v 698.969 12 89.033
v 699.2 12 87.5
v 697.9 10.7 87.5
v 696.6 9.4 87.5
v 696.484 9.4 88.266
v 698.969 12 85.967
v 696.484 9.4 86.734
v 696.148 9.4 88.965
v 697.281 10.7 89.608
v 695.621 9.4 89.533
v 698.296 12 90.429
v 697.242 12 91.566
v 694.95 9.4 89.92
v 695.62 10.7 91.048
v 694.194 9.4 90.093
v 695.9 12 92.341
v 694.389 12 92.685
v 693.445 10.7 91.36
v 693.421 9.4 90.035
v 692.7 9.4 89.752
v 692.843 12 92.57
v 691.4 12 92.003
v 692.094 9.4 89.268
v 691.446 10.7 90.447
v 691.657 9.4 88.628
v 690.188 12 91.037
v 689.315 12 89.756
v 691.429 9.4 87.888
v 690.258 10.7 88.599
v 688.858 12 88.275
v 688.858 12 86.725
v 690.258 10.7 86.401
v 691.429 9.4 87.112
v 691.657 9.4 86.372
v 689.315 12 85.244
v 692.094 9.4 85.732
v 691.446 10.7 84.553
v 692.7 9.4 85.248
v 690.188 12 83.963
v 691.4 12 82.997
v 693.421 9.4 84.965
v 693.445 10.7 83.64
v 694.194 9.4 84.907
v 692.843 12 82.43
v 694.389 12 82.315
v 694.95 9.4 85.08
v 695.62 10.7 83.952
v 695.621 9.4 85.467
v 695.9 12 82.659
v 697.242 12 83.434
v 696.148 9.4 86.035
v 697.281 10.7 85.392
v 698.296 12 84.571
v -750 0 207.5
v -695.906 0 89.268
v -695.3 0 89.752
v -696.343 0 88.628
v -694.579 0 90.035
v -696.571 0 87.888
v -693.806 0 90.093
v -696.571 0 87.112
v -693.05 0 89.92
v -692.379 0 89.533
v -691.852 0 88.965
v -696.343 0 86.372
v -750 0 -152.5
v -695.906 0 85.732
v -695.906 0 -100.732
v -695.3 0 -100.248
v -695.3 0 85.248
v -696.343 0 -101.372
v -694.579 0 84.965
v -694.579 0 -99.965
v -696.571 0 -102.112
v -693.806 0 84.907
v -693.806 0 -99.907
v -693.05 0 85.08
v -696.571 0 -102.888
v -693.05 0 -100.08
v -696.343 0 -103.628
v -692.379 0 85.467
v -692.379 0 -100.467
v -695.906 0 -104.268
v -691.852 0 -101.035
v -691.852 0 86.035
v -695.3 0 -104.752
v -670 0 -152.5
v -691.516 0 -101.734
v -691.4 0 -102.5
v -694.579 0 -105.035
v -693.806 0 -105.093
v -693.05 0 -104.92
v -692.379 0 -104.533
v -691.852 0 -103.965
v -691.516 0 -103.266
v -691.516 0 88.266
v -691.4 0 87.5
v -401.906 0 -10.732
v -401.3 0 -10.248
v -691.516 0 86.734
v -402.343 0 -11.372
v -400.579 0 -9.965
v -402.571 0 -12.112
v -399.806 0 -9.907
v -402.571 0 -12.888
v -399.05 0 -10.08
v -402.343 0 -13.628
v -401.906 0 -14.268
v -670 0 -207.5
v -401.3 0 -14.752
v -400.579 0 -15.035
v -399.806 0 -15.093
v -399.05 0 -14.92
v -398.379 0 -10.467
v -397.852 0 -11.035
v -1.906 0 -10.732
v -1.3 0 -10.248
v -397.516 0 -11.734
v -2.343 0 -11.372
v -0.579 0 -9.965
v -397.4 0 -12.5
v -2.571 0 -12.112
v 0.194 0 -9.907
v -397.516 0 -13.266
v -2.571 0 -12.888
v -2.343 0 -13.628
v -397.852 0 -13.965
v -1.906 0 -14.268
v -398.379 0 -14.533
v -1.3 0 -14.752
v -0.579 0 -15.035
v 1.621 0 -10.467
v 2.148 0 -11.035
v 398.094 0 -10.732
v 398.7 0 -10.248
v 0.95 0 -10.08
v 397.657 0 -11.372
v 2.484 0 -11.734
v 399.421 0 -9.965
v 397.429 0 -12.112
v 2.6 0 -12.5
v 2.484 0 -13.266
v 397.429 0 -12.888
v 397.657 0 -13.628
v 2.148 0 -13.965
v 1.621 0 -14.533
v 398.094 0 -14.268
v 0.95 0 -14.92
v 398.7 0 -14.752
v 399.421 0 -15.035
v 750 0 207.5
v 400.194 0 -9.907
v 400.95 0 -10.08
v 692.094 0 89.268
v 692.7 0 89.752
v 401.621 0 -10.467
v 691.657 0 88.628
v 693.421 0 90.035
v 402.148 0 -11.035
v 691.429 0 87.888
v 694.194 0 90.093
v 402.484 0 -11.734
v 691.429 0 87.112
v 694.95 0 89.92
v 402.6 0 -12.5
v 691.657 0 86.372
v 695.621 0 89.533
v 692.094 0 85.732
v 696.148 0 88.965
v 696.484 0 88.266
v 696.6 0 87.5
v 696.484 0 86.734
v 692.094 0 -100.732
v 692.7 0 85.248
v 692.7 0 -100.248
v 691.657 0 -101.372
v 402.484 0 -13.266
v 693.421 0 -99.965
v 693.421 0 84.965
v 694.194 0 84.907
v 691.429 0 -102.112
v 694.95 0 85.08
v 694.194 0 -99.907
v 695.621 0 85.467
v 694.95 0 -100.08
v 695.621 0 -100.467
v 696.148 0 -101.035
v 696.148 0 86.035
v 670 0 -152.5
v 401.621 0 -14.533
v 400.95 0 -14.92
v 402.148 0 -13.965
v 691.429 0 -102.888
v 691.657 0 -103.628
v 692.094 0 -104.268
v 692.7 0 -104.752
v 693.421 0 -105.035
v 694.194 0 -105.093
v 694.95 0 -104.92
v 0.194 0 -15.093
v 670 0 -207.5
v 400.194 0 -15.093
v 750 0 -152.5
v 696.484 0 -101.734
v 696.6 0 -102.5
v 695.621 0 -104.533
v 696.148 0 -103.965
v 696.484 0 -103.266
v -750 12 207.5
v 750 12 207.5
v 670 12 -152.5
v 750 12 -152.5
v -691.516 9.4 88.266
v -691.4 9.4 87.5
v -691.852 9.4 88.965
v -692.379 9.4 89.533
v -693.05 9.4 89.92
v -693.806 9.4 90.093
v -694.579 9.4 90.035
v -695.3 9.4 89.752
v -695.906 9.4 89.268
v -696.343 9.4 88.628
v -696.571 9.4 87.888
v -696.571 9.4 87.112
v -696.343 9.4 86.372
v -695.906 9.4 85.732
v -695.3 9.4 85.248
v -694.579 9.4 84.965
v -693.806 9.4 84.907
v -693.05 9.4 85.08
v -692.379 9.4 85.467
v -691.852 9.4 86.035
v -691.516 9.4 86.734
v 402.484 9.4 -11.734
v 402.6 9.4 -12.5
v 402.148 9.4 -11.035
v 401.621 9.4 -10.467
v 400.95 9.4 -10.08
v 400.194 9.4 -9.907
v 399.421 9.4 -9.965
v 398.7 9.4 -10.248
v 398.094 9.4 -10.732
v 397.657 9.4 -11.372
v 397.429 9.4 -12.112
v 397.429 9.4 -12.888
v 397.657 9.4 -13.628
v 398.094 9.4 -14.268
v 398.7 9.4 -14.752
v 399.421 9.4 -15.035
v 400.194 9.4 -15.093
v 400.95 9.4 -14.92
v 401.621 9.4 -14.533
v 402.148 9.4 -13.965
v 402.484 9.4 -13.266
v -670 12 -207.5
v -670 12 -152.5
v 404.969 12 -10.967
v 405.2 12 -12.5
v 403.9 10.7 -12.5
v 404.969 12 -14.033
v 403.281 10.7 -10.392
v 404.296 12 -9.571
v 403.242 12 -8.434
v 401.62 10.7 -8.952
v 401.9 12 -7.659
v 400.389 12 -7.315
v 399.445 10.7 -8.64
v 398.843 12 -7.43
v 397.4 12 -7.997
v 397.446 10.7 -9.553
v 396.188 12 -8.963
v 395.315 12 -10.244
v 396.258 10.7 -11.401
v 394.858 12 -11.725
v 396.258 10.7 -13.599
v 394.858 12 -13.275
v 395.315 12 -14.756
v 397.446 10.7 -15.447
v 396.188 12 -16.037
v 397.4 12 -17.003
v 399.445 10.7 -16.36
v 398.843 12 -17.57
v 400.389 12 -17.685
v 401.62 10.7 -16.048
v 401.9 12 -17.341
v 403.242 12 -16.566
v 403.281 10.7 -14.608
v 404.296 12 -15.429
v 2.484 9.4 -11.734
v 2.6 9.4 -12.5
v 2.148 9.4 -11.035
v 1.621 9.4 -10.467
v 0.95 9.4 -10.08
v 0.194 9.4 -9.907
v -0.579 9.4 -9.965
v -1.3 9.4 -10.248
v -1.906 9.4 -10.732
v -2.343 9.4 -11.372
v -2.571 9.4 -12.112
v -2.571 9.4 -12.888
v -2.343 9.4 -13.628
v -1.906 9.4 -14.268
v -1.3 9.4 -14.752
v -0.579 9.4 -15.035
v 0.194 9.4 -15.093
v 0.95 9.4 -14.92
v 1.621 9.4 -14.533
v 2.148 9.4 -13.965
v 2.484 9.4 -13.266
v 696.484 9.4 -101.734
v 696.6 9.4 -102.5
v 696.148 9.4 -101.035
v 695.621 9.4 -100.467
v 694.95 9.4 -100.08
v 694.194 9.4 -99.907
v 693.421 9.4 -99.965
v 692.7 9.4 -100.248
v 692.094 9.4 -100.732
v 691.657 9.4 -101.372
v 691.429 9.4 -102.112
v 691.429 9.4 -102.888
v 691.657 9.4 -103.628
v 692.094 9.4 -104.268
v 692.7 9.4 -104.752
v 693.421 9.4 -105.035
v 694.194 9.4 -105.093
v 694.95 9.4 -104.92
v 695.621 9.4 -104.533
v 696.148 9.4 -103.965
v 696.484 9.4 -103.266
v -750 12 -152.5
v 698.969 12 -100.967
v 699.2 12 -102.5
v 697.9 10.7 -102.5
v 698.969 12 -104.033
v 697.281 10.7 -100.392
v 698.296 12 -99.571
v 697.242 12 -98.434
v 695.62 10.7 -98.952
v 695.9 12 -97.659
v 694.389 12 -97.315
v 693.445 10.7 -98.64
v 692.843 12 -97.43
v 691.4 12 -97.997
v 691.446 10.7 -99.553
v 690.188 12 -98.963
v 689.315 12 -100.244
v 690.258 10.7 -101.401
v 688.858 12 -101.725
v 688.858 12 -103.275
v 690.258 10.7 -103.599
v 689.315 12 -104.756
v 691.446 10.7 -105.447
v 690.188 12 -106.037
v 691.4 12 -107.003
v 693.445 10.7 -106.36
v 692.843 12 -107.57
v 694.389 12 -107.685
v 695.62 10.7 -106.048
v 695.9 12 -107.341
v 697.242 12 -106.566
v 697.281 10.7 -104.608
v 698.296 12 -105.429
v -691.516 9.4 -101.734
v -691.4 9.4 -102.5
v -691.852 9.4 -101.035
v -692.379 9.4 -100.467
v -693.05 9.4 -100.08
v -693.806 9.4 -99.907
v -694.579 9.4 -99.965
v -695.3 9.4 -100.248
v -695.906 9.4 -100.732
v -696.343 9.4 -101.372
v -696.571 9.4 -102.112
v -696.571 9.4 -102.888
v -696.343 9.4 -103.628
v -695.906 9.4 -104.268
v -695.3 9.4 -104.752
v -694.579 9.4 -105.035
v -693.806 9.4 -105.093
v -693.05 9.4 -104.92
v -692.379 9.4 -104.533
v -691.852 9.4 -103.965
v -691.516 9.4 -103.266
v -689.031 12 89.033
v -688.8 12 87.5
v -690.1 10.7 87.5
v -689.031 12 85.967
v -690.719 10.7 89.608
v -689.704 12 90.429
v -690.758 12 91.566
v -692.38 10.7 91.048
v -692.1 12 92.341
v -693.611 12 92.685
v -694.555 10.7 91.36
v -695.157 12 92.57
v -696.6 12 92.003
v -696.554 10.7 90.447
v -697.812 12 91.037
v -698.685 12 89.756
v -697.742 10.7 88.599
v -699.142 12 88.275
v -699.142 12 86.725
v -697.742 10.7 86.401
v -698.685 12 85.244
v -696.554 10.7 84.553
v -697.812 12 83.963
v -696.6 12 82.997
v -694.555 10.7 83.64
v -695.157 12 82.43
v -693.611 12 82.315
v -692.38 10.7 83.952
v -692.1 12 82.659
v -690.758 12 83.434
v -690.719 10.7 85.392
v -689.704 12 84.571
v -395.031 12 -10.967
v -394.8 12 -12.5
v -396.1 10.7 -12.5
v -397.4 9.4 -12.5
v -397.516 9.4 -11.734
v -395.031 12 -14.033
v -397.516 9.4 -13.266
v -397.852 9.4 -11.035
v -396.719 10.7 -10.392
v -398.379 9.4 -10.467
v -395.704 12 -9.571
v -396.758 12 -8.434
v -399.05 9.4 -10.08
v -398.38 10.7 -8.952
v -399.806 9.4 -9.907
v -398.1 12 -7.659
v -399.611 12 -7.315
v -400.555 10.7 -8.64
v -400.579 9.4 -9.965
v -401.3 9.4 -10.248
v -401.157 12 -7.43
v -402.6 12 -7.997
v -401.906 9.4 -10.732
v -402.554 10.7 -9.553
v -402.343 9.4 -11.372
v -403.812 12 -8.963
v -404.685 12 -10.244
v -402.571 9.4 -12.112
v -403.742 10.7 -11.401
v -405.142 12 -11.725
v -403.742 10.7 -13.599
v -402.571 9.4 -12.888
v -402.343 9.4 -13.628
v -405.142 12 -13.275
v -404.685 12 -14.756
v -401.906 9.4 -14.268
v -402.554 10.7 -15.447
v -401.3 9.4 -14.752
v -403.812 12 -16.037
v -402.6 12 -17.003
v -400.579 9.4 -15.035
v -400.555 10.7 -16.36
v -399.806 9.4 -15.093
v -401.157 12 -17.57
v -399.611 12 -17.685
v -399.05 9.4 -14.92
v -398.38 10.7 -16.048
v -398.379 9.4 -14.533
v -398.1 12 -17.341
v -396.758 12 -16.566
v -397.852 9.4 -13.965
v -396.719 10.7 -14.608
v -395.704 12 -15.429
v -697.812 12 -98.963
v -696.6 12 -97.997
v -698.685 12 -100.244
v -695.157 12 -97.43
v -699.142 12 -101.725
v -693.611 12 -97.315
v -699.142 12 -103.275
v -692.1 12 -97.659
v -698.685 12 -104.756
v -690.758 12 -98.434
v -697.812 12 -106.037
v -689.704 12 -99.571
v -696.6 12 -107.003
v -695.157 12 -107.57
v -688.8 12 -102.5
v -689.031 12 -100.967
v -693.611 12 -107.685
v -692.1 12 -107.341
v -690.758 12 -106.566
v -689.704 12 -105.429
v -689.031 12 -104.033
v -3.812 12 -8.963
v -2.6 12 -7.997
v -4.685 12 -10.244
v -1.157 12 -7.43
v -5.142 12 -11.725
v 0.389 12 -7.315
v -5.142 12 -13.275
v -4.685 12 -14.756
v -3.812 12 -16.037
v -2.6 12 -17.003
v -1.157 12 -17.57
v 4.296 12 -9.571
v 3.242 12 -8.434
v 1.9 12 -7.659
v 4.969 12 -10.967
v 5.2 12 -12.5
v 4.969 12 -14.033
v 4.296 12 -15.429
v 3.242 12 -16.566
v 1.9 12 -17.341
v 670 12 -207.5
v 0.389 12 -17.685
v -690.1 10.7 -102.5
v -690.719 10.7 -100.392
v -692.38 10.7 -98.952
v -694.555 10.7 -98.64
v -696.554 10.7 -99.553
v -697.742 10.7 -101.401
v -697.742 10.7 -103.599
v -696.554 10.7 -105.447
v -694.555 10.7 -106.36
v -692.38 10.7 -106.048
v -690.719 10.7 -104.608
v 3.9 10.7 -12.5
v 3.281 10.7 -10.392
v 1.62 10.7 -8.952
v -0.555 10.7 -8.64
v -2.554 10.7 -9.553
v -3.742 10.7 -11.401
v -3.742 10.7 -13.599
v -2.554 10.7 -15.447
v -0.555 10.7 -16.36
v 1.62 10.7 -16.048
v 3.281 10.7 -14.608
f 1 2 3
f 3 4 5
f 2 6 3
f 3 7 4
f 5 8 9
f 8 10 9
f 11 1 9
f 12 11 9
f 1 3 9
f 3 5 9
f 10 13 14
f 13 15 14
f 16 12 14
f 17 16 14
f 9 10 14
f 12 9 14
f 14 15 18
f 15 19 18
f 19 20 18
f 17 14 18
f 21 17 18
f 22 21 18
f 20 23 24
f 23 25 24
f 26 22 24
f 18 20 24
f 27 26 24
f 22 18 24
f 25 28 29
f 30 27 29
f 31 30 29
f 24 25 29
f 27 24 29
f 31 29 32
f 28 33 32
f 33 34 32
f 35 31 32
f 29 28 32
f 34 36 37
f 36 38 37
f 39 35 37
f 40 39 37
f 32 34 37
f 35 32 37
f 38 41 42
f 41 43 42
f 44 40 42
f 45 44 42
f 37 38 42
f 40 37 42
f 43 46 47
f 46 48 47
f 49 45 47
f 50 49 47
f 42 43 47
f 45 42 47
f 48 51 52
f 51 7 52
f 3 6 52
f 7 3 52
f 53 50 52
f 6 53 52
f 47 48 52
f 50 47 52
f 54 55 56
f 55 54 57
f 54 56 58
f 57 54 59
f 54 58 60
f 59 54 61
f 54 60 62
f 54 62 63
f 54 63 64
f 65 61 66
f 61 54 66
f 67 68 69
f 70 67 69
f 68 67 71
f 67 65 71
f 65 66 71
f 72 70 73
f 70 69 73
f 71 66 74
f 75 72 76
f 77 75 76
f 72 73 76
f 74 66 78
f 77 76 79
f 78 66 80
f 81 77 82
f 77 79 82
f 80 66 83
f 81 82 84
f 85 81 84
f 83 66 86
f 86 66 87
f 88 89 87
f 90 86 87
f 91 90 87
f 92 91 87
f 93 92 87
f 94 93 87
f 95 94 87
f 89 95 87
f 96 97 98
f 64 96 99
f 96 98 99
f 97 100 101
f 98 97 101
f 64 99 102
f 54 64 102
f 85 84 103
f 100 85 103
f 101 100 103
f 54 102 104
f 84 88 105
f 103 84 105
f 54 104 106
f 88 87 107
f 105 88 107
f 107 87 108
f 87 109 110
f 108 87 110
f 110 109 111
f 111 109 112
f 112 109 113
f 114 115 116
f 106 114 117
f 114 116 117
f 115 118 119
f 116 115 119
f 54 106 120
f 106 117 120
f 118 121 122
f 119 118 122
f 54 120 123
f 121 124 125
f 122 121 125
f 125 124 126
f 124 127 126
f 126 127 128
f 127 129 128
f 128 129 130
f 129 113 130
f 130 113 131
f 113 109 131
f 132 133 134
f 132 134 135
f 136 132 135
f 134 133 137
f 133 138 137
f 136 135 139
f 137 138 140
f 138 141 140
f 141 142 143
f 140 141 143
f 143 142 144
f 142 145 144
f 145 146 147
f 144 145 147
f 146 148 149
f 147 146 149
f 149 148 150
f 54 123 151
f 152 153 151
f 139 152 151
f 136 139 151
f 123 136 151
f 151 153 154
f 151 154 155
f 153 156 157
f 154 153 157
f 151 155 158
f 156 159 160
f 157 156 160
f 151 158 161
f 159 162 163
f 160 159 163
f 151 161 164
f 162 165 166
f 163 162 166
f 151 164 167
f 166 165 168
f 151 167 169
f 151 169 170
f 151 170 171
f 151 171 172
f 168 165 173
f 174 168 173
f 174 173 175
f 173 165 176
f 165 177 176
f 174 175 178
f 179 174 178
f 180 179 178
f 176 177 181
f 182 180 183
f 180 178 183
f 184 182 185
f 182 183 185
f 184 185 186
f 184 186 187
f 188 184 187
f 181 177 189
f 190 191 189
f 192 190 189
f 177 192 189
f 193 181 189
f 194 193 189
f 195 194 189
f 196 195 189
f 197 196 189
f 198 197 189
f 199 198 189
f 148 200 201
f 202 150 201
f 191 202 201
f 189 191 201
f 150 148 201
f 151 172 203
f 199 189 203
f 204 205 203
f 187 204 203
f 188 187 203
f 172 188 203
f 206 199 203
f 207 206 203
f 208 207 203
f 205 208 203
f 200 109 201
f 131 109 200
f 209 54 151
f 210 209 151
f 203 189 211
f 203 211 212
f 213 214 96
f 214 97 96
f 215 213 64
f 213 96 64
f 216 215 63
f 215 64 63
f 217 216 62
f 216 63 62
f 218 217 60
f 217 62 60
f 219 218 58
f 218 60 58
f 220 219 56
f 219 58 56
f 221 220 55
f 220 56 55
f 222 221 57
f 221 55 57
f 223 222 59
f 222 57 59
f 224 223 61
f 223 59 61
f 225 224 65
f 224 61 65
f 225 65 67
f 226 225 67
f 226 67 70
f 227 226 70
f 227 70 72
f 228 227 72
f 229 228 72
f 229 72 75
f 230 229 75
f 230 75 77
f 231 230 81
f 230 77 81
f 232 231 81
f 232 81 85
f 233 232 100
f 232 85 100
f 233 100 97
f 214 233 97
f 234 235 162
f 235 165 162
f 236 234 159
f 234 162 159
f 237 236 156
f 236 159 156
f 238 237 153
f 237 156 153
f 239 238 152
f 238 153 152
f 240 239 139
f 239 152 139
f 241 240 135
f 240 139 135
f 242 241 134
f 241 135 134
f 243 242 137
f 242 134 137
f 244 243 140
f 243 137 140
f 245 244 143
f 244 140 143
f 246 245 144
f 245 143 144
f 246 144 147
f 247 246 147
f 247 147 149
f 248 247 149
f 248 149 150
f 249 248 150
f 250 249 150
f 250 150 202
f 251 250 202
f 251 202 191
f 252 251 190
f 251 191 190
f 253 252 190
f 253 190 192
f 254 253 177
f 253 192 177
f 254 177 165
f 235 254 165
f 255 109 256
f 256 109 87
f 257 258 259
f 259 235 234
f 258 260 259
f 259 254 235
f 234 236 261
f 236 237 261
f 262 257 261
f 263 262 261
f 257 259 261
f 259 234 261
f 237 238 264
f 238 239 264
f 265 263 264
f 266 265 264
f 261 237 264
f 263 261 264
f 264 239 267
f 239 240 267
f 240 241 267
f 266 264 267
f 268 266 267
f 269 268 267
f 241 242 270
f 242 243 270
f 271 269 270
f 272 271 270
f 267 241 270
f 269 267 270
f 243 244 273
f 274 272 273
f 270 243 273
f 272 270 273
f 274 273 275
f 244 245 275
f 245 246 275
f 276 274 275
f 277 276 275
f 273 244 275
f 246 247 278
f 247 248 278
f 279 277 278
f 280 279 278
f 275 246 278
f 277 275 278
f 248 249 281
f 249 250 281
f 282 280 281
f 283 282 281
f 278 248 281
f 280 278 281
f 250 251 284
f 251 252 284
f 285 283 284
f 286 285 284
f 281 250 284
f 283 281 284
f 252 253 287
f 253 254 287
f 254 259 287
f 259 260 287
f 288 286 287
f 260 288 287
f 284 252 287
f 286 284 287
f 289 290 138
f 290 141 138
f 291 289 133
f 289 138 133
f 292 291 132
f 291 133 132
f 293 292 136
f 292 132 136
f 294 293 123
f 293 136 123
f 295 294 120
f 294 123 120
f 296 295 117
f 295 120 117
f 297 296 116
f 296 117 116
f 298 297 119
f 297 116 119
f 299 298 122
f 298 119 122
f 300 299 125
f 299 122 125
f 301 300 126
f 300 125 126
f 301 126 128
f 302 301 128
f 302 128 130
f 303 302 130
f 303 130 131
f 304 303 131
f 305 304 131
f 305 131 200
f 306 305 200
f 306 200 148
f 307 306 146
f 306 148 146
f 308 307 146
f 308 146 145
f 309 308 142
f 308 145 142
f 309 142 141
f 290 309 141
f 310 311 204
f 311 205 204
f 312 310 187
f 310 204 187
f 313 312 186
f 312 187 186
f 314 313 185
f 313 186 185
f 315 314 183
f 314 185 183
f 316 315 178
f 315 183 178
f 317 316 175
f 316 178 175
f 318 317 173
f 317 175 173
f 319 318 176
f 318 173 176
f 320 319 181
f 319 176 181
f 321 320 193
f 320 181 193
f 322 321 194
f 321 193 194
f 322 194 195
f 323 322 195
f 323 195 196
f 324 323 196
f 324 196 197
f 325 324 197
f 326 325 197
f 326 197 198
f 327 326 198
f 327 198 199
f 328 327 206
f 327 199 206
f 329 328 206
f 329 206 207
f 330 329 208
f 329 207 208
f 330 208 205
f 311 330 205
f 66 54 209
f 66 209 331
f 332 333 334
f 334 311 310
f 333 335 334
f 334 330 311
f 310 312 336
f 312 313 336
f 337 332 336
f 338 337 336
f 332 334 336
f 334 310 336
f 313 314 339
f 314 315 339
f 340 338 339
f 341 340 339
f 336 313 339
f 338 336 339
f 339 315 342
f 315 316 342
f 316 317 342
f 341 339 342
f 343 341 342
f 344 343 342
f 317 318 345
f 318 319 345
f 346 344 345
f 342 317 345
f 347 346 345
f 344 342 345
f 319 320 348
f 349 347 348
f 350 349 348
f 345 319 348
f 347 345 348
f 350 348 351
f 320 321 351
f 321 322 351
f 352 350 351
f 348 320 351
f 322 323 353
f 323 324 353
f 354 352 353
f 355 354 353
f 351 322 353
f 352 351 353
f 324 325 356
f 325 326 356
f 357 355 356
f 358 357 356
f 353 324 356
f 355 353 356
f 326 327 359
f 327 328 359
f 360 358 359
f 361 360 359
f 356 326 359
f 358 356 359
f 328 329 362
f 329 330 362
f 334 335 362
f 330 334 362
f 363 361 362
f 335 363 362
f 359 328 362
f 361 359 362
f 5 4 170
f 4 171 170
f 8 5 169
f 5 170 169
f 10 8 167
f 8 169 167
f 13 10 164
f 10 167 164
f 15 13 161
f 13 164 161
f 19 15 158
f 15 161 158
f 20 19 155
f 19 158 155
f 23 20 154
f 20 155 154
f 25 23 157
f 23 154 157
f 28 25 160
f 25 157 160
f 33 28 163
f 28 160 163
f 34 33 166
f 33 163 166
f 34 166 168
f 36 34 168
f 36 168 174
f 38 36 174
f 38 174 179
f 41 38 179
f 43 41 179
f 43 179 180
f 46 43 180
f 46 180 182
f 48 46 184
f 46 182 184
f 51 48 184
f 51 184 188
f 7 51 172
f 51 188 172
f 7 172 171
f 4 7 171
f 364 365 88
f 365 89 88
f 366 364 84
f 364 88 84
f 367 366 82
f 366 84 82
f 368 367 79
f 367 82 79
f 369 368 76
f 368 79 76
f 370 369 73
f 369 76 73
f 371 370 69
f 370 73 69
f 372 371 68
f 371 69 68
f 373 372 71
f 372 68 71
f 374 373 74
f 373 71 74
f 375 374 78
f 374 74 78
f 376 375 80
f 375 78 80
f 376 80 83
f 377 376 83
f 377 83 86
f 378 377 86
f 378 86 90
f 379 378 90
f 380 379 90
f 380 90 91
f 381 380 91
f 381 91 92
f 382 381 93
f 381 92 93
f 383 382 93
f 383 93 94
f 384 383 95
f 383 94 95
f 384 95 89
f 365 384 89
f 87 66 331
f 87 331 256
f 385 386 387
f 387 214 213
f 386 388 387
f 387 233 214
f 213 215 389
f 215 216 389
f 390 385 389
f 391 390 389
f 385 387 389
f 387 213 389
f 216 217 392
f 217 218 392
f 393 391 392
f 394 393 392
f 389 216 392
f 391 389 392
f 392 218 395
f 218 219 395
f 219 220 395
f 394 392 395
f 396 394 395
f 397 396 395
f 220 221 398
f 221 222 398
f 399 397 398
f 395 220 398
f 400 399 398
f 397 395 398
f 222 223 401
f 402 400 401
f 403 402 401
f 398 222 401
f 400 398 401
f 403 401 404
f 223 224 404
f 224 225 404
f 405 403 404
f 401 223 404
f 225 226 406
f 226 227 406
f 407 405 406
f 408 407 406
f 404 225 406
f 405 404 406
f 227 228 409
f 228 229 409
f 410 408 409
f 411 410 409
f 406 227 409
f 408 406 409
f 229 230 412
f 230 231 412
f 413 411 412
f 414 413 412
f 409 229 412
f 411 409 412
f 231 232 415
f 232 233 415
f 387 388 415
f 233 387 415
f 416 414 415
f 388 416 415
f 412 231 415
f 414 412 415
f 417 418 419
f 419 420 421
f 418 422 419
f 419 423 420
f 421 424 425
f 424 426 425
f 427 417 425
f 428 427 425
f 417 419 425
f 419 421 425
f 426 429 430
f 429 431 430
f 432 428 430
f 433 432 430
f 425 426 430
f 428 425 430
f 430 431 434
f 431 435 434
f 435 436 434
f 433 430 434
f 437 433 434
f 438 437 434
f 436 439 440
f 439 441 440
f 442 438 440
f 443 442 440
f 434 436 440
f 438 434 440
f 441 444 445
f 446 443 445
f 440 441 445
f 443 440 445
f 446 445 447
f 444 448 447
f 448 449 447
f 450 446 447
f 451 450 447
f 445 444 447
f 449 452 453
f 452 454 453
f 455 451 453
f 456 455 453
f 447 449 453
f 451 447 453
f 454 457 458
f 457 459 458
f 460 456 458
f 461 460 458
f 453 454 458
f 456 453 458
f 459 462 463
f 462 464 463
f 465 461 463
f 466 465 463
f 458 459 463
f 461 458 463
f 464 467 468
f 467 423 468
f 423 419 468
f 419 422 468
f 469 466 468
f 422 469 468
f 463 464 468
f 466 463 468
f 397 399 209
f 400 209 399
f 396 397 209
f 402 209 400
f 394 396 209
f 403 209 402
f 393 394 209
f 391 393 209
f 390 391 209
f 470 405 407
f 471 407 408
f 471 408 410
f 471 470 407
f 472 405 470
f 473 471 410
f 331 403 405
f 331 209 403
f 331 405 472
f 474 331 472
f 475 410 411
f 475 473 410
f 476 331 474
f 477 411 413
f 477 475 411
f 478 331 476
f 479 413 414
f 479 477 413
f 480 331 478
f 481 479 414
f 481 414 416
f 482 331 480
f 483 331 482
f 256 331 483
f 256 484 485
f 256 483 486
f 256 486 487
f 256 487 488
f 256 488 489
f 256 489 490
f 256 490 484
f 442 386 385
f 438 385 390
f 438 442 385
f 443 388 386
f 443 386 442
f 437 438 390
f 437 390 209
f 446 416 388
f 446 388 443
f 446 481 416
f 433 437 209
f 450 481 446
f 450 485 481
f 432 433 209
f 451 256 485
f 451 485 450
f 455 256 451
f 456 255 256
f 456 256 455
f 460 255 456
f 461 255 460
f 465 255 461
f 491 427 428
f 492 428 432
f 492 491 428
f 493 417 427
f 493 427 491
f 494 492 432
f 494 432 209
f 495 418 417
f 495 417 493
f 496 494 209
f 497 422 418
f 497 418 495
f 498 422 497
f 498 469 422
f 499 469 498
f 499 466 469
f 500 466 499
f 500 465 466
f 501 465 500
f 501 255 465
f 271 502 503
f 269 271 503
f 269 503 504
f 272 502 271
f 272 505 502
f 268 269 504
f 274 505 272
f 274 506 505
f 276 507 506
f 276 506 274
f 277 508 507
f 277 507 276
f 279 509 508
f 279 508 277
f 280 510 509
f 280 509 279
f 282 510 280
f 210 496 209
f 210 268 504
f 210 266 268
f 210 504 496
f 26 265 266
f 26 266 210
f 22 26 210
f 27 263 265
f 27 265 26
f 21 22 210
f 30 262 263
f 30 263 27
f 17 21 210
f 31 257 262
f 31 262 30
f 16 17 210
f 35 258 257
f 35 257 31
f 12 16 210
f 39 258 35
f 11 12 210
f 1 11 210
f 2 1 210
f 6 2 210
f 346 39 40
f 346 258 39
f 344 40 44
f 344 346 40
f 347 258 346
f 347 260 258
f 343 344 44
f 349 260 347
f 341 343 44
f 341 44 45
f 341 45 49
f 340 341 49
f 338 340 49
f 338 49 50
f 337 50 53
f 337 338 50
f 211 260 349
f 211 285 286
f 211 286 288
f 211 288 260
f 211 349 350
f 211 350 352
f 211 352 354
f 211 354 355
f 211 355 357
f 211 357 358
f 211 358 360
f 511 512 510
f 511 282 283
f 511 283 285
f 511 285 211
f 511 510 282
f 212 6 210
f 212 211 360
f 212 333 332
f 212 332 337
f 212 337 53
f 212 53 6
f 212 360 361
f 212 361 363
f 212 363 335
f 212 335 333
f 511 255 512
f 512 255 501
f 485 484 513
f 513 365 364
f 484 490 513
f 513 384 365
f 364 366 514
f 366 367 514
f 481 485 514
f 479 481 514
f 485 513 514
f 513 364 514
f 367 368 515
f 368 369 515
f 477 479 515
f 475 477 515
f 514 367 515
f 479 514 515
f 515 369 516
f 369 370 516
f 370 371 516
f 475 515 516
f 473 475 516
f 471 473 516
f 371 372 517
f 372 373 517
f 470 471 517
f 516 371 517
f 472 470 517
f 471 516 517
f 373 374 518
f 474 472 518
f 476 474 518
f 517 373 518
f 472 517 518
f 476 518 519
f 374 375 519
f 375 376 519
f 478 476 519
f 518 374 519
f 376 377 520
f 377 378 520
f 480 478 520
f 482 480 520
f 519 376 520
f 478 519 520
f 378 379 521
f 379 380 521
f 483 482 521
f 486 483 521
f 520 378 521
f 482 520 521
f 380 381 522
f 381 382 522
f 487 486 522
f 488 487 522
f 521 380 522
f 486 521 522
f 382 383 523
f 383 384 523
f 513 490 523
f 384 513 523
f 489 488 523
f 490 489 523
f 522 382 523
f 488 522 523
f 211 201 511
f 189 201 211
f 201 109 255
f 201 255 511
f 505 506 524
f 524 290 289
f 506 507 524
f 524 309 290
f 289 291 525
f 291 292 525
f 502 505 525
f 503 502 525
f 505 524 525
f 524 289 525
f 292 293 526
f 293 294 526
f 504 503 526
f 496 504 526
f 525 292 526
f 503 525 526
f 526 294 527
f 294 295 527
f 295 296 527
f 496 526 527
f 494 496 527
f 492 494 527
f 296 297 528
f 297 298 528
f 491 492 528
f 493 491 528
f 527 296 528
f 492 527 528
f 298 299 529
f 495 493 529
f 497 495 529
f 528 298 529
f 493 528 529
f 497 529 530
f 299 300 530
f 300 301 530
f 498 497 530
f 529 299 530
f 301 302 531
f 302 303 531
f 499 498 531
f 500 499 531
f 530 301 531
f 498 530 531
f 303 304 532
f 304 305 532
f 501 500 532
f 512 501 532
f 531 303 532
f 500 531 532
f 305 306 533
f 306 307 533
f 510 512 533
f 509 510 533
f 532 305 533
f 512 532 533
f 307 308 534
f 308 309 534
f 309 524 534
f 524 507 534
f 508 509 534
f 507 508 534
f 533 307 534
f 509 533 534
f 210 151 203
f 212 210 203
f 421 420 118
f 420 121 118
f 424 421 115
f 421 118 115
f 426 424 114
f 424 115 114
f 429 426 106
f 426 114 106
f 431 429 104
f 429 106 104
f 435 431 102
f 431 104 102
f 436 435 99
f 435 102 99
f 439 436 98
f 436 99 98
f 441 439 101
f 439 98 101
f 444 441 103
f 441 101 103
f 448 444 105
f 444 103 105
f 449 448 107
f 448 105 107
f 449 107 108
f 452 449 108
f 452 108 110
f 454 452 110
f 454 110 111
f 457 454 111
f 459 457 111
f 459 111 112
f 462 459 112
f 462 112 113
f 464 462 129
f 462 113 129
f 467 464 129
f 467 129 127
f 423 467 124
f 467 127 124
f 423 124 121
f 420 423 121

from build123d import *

# Parameters (mm, degrees)
SKETCH1_W                                       = 1500
SKETCH1_H                                       = 415
RAWMATERIAL_DEPTH                               = 12
CSK_FOR_M5_FLAT_HEAD_MACHINE_SCREW1_D           = 5.2
CSK_FOR_M5_FLAT_HEAD_MACHINE_SCREW1_CSINK_D     = 10.4
CSK_FOR_M5_FLAT_HEAD_MACHINE_SCREW1_CSINK_ANGLE = 90
SKETCH5_W                                       = 80
SKETCH5_H                                       = 55
FRAME_SLOTS_DEPTH                               = 779.267466878


with BuildPart() as part:
    # Sketch1 → RawMaterial (new body)
    with BuildSketch(Plane(origin=(0, 0, 0), x_dir=(1, 0, 0), z_dir=(0, 1, 0))):
        Rectangle(SKETCH1_W, SKETCH1_H)
    extrude(amount=RAWMATERIAL_DEPTH)

    # CSK for M5 Flat Head Machine Screw1 (through all)
    with Locations(Plane(origin=(0, 12, 0), x_dir=(-1, 0, 0), z_dir=(0, 1, 0))):
        with Locations((-694, -102.5), (-694, 87.5), (-400, -12.5), (400, -12.5), (694, 87.5), (694, -102.5), (0, -12.5)):
            CounterSinkHole(CSK_FOR_M5_FLAT_HEAD_MACHINE_SCREW1_D / 2, CSK_FOR_M5_FLAT_HEAD_MACHINE_SCREW1_CSINK_D / 2, counter_sink_angle=CSK_FOR_M5_FLAT_HEAD_MACHINE_SCREW1_CSINK_ANGLE)

    # Sketch5 → Frame Slots (cut, through all)
    with BuildSketch(Plane.XZ):
        with Locations((-710, -180)):
            Rectangle(SKETCH5_W, SKETCH5_H)
        with Locations((710, -180)):
            Rectangle(SKETCH5_W, SKETCH5_H)
    extrude(amount=-FRAME_SLOTS_DEPTH, mode=Mode.SUBTRACT)


solid = part.part
